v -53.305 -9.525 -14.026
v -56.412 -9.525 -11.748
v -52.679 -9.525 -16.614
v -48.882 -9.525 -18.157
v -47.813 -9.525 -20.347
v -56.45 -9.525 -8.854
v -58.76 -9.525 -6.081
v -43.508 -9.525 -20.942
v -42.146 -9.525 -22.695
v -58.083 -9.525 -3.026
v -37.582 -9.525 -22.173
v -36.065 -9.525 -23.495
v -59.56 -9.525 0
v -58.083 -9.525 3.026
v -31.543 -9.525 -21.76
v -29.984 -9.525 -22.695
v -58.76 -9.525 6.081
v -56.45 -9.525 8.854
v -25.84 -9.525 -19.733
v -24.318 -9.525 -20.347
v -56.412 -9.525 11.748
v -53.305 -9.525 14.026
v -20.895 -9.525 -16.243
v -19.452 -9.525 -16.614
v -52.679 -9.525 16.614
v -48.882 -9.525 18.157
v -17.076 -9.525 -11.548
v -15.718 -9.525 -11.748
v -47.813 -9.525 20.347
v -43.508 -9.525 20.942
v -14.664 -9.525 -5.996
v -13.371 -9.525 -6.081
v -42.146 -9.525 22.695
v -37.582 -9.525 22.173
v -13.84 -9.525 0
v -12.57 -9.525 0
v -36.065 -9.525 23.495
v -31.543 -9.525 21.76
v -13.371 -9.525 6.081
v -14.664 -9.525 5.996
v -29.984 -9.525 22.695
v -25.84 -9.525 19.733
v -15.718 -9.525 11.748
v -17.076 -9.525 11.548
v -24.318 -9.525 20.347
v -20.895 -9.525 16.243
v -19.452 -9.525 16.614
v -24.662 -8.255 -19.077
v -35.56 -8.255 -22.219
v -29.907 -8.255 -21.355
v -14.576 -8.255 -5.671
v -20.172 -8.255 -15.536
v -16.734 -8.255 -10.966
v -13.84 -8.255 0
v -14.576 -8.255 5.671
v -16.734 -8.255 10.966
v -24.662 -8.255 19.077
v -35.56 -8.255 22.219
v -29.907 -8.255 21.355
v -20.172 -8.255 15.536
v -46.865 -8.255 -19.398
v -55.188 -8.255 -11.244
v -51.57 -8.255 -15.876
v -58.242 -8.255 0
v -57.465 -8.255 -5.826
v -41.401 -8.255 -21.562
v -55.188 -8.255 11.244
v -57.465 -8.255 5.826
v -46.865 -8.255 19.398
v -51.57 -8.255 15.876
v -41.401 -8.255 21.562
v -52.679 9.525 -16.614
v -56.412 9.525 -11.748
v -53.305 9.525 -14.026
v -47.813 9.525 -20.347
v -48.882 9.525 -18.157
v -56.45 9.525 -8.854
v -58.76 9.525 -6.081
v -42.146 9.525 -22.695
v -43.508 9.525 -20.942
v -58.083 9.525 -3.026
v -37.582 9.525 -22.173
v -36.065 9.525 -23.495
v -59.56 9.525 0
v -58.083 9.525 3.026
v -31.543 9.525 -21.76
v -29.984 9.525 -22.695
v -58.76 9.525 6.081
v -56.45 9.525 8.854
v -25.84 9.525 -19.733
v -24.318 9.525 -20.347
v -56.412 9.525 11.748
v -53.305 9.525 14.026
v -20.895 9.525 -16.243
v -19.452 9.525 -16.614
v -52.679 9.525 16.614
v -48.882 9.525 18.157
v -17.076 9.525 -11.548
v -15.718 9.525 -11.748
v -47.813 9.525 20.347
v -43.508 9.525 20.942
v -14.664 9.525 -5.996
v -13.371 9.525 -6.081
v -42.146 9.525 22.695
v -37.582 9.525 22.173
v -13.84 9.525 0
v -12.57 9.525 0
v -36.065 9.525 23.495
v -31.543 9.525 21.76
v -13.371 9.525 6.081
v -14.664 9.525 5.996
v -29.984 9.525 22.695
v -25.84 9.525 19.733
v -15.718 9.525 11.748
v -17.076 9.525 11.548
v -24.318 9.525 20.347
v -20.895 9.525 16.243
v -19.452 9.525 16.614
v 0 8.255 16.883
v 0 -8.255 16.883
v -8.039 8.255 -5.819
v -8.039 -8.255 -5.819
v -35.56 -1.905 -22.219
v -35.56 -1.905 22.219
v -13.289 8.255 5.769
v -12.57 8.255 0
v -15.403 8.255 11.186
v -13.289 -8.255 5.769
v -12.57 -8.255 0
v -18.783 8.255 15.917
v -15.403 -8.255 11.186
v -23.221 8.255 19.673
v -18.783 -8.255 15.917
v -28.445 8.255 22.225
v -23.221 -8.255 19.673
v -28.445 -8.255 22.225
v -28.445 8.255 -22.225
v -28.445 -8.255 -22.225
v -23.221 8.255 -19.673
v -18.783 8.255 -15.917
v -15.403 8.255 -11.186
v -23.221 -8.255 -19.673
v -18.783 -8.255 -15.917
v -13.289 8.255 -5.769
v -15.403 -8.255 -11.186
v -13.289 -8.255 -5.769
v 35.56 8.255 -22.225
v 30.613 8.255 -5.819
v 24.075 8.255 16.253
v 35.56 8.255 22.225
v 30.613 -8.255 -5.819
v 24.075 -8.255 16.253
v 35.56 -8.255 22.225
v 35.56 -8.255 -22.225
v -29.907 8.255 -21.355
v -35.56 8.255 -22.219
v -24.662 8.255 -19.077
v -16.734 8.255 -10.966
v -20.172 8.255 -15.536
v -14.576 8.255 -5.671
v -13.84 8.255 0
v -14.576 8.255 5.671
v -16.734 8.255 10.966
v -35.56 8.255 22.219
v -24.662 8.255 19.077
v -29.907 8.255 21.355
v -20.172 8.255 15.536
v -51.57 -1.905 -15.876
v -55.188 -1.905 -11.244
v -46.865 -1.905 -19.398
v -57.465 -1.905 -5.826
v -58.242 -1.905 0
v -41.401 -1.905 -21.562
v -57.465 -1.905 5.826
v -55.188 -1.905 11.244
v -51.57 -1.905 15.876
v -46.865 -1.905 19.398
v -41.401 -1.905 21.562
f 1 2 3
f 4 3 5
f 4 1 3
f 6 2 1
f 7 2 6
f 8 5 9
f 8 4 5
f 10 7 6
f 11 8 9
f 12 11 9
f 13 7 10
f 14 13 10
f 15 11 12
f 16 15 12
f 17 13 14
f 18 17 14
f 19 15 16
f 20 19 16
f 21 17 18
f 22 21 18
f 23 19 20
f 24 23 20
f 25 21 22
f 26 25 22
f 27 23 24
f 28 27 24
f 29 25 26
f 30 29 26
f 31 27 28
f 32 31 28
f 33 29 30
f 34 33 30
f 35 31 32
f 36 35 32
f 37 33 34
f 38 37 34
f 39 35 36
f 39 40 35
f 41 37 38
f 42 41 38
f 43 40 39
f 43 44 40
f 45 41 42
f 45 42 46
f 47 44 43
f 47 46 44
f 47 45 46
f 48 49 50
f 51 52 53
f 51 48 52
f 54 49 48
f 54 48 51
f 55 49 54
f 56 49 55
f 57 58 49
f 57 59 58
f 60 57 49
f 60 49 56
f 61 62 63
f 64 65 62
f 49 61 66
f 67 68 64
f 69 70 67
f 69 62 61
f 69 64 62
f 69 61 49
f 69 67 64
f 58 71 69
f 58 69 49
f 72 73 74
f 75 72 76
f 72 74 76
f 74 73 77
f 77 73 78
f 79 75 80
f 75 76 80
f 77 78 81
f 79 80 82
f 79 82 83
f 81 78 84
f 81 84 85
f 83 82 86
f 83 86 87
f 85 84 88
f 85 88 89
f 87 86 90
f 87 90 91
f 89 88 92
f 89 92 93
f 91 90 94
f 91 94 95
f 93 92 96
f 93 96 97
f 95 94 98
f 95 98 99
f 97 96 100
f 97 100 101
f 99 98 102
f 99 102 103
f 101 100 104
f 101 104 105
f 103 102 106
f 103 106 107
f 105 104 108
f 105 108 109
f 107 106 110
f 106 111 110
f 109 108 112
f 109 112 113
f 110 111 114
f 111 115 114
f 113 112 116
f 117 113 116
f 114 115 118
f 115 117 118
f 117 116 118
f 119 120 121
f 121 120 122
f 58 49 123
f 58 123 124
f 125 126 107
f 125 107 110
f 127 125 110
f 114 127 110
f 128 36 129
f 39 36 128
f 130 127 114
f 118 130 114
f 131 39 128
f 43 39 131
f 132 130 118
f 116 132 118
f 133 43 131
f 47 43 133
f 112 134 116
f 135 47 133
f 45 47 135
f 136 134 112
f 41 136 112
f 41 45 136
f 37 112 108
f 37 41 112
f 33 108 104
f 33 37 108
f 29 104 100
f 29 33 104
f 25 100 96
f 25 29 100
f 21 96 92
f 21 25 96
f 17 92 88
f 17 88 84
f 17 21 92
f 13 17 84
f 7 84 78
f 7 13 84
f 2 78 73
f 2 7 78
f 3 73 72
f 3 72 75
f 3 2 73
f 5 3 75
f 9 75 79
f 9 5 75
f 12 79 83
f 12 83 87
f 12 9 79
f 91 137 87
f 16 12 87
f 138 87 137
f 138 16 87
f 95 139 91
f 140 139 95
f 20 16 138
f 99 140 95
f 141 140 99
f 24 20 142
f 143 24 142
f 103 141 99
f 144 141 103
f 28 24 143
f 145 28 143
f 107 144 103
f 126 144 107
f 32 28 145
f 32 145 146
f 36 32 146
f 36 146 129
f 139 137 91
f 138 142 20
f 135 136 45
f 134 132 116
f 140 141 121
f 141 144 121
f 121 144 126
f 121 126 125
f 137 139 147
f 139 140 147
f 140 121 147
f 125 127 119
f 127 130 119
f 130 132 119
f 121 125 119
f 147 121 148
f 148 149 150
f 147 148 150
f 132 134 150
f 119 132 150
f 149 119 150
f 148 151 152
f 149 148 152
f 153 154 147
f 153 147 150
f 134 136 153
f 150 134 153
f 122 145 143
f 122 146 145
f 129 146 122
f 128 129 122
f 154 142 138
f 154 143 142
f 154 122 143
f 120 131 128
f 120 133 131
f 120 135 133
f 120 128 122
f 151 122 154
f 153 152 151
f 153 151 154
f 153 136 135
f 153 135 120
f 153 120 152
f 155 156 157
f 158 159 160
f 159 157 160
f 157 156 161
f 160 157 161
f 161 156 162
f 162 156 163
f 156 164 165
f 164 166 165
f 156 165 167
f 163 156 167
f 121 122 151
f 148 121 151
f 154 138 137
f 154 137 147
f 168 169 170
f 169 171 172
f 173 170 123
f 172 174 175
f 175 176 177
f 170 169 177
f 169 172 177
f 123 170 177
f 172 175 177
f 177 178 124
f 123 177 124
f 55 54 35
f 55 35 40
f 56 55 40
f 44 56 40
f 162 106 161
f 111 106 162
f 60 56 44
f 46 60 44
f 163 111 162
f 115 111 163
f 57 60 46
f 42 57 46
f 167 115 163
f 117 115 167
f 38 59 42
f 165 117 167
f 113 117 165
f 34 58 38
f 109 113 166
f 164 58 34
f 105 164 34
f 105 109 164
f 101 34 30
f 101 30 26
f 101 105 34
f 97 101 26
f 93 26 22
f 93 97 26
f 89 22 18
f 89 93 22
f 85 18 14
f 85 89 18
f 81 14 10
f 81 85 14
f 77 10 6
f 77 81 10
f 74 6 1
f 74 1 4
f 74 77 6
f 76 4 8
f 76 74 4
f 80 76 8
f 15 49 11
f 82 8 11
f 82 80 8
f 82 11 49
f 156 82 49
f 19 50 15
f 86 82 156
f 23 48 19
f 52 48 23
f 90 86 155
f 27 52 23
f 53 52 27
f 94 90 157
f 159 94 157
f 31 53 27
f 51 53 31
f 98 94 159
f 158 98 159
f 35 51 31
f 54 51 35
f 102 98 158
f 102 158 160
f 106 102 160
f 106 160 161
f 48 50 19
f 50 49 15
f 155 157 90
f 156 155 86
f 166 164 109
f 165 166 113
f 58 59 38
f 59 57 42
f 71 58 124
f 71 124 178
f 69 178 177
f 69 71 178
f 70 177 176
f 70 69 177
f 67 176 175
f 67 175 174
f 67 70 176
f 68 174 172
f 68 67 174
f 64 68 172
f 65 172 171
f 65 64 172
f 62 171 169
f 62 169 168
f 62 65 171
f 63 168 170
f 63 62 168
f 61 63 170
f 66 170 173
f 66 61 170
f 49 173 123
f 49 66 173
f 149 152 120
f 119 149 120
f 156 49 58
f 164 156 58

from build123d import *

# Parameters (mm, degrees)
F1_R     = 23.4951168528
F1_R_2   = 22.225
F2_DEPTH = 9.525
F0_W     = 71.12
F0_H     = 44.45
F3_DEPTH = 8.255
F5_DEPTH = 6.35
F7_DEPTH = 17.781


# Not quite as in the source:
# - the program builds the solid bodies; features that only make, move or delete a surface that nothing else refers to are left out


with BuildPart() as f2:
    # F1 (on Front) → F2 (new body, symmetric)
    with BuildSketch(Plane.XZ):
        with Locations((-36.0651165247, 0)):
            Circle(F1_R)
        with Locations((-36.0651165247, 0)):
            Circle(F1_R_2, mode=Mode.SUBTRACT)
    extrude(amount=F2_DEPTH, both=True)

    # F0 (on Front) → F3 (join, symmetric)
    with BuildSketch(Plane.XZ):
        Rectangle(F0_W, F0_H)
    extrude(amount=F3_DEPTH, both=True)

    # F6 (on face) → F7 (cut, through all)
    with BuildSketch(Plane.XZ.offset(8.255)):
        Polygon((0, 16.8832416568), (-8.0388132402, -5.8187644509), (30.6133943614, -5.8187644509), (24.0750207475, 16.2531816351), align=None)
    extrude(amount=-F7_DEPTH, mode=Mode.SUBTRACT)


with BuildPart() as f5:
    # F4 (on face) → F5 (new body)
    with BuildSketch(Plane.XZ.offset(8.255)):
        with BuildLine():
            Line((-35.56, -22.2192592653), (-35.56, 22.2192592653))
            ThreePointArc((-35.56, 22.2192592653), (-58.242372306, 0), (-35.56, -22.2192592653))
        make_face()
    extrude(amount=-F5_DEPTH)


solid = Compound([f2.part, f5.part])
